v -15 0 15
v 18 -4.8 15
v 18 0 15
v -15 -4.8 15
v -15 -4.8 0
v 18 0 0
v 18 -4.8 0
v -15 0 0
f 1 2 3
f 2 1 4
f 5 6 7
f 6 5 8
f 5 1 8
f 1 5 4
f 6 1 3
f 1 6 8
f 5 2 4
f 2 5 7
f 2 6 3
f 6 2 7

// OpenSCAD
err = 0.01;
w = 10;
H = 50;
R = 1;
$fn=10;
dw = 2;

scale([0.3,-0.3,0.3])
for(i=[-5:5])
    translate([w*i,0,0]){
        color([0.8,0.2,0.2])
                cube([w,dw,H]);
            
        translate([0,dw*2,0]){
            color([0.6,0.6,0.6])
            difference(){
                    cube([w,w,H]);
                    translate([w/2,w/2,-err])cylinder(h=H+err*2,r=R);
            }
            color([1,1,1])
                translate([w/2,w/2,0])
                    cylinder(h=H,r=R);
        }
        color([1,1,0.8])
            translate([0,dw,0])
                cube([w,dw,H]);
            color([0.4,0.4,0.4])
            translate([0,w+dw*2,0])
                cube([w,dw,H]);
    }
